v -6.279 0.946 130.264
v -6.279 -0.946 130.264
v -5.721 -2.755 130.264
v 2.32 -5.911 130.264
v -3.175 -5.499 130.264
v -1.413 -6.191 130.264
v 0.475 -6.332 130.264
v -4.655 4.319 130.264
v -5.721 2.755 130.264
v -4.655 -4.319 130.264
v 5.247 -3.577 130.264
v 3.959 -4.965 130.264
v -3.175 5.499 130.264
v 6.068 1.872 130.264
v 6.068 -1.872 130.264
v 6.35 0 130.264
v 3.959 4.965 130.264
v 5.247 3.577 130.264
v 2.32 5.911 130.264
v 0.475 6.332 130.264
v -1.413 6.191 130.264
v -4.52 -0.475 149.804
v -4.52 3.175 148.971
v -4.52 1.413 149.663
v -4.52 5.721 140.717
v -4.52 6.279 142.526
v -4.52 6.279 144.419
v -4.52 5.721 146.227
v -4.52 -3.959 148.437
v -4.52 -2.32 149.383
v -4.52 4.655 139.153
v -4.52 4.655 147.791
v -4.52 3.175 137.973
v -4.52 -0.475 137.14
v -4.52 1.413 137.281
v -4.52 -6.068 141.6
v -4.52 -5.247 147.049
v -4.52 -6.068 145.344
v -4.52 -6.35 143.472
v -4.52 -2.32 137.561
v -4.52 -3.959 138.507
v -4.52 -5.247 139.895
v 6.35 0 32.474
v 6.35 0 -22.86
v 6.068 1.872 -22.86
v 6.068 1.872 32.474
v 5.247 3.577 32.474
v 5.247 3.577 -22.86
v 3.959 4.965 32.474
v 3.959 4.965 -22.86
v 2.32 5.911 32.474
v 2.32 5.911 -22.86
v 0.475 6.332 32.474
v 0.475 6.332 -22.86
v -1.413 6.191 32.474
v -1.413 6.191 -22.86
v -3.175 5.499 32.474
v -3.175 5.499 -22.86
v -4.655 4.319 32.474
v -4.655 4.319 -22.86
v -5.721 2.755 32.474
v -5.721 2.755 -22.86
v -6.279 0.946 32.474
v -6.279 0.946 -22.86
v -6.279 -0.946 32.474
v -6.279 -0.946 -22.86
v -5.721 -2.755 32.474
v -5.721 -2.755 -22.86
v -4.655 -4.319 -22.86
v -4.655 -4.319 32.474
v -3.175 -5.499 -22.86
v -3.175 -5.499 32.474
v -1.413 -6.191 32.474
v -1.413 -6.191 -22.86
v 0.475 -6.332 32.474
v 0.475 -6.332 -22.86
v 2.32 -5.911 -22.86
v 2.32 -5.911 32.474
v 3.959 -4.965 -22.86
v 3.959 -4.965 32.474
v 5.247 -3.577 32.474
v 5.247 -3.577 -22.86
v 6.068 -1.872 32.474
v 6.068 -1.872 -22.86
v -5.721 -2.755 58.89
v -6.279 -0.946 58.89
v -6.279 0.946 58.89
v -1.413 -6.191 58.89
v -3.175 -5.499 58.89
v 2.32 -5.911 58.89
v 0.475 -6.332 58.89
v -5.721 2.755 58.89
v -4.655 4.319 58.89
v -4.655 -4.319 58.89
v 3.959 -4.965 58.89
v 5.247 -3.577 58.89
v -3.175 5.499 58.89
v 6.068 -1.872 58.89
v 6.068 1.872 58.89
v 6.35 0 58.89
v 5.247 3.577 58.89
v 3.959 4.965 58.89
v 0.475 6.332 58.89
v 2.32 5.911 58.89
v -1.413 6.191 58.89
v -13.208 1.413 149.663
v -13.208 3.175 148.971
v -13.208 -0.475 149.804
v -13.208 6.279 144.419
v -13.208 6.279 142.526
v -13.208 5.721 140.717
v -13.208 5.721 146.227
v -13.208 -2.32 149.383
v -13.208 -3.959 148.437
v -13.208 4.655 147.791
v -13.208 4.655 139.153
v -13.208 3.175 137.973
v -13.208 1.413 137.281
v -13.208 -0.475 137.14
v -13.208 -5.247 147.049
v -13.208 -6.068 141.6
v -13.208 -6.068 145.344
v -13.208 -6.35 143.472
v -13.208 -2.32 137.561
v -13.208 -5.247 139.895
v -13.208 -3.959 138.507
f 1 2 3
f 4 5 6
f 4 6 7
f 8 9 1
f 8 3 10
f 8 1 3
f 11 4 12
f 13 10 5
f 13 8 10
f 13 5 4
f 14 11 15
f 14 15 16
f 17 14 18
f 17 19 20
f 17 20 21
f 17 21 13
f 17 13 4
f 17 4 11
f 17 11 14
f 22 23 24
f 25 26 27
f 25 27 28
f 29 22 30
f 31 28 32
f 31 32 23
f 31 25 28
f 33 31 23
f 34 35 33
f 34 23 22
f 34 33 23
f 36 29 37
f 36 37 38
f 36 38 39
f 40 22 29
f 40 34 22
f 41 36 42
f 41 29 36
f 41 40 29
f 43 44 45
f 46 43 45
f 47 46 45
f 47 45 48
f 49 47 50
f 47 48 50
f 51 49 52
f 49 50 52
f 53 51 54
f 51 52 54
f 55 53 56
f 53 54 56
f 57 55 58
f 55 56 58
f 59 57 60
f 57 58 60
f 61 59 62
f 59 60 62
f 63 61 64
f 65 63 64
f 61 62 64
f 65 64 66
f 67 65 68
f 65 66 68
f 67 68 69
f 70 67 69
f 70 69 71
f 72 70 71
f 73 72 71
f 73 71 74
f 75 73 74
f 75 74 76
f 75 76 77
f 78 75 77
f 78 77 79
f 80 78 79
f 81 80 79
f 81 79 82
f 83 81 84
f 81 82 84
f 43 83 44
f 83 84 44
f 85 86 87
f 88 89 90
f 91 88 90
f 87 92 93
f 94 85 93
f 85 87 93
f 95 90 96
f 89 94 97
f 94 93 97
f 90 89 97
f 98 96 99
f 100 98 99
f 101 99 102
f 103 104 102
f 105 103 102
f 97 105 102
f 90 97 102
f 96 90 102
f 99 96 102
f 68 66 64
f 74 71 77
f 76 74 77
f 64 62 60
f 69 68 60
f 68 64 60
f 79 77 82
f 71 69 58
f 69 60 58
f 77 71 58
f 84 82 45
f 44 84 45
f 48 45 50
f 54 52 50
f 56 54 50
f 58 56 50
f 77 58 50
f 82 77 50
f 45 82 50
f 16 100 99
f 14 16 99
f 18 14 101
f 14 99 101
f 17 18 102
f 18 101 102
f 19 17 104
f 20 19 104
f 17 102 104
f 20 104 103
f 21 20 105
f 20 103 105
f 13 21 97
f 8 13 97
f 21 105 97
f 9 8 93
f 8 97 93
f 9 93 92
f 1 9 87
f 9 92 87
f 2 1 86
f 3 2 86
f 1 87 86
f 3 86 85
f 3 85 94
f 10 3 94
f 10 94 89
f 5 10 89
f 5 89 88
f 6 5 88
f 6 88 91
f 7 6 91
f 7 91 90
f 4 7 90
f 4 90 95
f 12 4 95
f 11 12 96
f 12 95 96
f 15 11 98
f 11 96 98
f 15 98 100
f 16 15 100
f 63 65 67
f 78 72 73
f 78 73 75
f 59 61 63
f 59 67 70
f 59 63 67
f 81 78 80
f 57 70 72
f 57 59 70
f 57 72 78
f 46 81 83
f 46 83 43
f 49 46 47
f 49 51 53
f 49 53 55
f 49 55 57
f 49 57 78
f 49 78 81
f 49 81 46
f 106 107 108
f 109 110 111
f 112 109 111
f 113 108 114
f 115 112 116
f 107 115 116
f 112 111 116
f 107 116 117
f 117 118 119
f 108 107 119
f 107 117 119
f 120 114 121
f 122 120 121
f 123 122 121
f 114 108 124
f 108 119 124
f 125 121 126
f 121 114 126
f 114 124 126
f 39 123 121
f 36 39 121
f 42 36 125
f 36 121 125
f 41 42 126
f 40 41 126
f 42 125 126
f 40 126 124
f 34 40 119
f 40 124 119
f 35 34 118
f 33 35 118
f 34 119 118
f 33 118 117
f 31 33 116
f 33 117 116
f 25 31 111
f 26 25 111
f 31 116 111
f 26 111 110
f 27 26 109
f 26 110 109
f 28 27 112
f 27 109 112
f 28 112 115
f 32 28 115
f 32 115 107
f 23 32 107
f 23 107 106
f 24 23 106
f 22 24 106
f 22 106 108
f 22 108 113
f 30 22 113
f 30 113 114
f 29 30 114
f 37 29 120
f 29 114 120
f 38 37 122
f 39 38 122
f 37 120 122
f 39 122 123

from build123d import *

# Parameters (mm, degrees)
BOSS_EXTRUDE1_OUTLINE_R = 6.35
BOSS_EXTRUDE1_DEPTH     = 55.334112963
SKETCH3_R               = 6.35
BOSS_EXTRUDE2_DEPTH     = 71.374
SKETCH4_R               = 6.350000006
BOSS_EXTRUDE3_DEPTH     = 8.687669


# Read off the part's stored shape, not the designer's step: Boss-Extrude1
with BuildPart() as part:
    # Boss-Extrude1 outline → Boss-Extrude1 (new body)
    with BuildSketch(Plane.XY.offset(-22.86)):
        Circle(BOSS_EXTRUDE1_OUTLINE_R)
    extrude(amount=BOSS_EXTRUDE1_DEPTH)


with BuildPart() as body_2:
    # Sketch3 → Boss-Extrude2 (new body)
    with BuildSketch(Plane.XY.offset(58.890112963)):
        Circle(SKETCH3_R)
    extrude(amount=BOSS_EXTRUDE2_DEPTH)


with BuildPart() as body_3:
    # Sketch4 → Boss-Extrude3 (new body)
    with BuildSketch(Plane(origin=(-13.208, 0, 0), x_dir=(0, 0, -1), z_dir=(1, 0, 0))):
        with Locations(Location((-143.472112963, 0, 0), (0, 0, 270))):
            Circle(SKETCH4_R)
    extrude(amount=BOSS_EXTRUDE3_DEPTH)


solid = Compound([part.part, body_2.part, body_3.part])
